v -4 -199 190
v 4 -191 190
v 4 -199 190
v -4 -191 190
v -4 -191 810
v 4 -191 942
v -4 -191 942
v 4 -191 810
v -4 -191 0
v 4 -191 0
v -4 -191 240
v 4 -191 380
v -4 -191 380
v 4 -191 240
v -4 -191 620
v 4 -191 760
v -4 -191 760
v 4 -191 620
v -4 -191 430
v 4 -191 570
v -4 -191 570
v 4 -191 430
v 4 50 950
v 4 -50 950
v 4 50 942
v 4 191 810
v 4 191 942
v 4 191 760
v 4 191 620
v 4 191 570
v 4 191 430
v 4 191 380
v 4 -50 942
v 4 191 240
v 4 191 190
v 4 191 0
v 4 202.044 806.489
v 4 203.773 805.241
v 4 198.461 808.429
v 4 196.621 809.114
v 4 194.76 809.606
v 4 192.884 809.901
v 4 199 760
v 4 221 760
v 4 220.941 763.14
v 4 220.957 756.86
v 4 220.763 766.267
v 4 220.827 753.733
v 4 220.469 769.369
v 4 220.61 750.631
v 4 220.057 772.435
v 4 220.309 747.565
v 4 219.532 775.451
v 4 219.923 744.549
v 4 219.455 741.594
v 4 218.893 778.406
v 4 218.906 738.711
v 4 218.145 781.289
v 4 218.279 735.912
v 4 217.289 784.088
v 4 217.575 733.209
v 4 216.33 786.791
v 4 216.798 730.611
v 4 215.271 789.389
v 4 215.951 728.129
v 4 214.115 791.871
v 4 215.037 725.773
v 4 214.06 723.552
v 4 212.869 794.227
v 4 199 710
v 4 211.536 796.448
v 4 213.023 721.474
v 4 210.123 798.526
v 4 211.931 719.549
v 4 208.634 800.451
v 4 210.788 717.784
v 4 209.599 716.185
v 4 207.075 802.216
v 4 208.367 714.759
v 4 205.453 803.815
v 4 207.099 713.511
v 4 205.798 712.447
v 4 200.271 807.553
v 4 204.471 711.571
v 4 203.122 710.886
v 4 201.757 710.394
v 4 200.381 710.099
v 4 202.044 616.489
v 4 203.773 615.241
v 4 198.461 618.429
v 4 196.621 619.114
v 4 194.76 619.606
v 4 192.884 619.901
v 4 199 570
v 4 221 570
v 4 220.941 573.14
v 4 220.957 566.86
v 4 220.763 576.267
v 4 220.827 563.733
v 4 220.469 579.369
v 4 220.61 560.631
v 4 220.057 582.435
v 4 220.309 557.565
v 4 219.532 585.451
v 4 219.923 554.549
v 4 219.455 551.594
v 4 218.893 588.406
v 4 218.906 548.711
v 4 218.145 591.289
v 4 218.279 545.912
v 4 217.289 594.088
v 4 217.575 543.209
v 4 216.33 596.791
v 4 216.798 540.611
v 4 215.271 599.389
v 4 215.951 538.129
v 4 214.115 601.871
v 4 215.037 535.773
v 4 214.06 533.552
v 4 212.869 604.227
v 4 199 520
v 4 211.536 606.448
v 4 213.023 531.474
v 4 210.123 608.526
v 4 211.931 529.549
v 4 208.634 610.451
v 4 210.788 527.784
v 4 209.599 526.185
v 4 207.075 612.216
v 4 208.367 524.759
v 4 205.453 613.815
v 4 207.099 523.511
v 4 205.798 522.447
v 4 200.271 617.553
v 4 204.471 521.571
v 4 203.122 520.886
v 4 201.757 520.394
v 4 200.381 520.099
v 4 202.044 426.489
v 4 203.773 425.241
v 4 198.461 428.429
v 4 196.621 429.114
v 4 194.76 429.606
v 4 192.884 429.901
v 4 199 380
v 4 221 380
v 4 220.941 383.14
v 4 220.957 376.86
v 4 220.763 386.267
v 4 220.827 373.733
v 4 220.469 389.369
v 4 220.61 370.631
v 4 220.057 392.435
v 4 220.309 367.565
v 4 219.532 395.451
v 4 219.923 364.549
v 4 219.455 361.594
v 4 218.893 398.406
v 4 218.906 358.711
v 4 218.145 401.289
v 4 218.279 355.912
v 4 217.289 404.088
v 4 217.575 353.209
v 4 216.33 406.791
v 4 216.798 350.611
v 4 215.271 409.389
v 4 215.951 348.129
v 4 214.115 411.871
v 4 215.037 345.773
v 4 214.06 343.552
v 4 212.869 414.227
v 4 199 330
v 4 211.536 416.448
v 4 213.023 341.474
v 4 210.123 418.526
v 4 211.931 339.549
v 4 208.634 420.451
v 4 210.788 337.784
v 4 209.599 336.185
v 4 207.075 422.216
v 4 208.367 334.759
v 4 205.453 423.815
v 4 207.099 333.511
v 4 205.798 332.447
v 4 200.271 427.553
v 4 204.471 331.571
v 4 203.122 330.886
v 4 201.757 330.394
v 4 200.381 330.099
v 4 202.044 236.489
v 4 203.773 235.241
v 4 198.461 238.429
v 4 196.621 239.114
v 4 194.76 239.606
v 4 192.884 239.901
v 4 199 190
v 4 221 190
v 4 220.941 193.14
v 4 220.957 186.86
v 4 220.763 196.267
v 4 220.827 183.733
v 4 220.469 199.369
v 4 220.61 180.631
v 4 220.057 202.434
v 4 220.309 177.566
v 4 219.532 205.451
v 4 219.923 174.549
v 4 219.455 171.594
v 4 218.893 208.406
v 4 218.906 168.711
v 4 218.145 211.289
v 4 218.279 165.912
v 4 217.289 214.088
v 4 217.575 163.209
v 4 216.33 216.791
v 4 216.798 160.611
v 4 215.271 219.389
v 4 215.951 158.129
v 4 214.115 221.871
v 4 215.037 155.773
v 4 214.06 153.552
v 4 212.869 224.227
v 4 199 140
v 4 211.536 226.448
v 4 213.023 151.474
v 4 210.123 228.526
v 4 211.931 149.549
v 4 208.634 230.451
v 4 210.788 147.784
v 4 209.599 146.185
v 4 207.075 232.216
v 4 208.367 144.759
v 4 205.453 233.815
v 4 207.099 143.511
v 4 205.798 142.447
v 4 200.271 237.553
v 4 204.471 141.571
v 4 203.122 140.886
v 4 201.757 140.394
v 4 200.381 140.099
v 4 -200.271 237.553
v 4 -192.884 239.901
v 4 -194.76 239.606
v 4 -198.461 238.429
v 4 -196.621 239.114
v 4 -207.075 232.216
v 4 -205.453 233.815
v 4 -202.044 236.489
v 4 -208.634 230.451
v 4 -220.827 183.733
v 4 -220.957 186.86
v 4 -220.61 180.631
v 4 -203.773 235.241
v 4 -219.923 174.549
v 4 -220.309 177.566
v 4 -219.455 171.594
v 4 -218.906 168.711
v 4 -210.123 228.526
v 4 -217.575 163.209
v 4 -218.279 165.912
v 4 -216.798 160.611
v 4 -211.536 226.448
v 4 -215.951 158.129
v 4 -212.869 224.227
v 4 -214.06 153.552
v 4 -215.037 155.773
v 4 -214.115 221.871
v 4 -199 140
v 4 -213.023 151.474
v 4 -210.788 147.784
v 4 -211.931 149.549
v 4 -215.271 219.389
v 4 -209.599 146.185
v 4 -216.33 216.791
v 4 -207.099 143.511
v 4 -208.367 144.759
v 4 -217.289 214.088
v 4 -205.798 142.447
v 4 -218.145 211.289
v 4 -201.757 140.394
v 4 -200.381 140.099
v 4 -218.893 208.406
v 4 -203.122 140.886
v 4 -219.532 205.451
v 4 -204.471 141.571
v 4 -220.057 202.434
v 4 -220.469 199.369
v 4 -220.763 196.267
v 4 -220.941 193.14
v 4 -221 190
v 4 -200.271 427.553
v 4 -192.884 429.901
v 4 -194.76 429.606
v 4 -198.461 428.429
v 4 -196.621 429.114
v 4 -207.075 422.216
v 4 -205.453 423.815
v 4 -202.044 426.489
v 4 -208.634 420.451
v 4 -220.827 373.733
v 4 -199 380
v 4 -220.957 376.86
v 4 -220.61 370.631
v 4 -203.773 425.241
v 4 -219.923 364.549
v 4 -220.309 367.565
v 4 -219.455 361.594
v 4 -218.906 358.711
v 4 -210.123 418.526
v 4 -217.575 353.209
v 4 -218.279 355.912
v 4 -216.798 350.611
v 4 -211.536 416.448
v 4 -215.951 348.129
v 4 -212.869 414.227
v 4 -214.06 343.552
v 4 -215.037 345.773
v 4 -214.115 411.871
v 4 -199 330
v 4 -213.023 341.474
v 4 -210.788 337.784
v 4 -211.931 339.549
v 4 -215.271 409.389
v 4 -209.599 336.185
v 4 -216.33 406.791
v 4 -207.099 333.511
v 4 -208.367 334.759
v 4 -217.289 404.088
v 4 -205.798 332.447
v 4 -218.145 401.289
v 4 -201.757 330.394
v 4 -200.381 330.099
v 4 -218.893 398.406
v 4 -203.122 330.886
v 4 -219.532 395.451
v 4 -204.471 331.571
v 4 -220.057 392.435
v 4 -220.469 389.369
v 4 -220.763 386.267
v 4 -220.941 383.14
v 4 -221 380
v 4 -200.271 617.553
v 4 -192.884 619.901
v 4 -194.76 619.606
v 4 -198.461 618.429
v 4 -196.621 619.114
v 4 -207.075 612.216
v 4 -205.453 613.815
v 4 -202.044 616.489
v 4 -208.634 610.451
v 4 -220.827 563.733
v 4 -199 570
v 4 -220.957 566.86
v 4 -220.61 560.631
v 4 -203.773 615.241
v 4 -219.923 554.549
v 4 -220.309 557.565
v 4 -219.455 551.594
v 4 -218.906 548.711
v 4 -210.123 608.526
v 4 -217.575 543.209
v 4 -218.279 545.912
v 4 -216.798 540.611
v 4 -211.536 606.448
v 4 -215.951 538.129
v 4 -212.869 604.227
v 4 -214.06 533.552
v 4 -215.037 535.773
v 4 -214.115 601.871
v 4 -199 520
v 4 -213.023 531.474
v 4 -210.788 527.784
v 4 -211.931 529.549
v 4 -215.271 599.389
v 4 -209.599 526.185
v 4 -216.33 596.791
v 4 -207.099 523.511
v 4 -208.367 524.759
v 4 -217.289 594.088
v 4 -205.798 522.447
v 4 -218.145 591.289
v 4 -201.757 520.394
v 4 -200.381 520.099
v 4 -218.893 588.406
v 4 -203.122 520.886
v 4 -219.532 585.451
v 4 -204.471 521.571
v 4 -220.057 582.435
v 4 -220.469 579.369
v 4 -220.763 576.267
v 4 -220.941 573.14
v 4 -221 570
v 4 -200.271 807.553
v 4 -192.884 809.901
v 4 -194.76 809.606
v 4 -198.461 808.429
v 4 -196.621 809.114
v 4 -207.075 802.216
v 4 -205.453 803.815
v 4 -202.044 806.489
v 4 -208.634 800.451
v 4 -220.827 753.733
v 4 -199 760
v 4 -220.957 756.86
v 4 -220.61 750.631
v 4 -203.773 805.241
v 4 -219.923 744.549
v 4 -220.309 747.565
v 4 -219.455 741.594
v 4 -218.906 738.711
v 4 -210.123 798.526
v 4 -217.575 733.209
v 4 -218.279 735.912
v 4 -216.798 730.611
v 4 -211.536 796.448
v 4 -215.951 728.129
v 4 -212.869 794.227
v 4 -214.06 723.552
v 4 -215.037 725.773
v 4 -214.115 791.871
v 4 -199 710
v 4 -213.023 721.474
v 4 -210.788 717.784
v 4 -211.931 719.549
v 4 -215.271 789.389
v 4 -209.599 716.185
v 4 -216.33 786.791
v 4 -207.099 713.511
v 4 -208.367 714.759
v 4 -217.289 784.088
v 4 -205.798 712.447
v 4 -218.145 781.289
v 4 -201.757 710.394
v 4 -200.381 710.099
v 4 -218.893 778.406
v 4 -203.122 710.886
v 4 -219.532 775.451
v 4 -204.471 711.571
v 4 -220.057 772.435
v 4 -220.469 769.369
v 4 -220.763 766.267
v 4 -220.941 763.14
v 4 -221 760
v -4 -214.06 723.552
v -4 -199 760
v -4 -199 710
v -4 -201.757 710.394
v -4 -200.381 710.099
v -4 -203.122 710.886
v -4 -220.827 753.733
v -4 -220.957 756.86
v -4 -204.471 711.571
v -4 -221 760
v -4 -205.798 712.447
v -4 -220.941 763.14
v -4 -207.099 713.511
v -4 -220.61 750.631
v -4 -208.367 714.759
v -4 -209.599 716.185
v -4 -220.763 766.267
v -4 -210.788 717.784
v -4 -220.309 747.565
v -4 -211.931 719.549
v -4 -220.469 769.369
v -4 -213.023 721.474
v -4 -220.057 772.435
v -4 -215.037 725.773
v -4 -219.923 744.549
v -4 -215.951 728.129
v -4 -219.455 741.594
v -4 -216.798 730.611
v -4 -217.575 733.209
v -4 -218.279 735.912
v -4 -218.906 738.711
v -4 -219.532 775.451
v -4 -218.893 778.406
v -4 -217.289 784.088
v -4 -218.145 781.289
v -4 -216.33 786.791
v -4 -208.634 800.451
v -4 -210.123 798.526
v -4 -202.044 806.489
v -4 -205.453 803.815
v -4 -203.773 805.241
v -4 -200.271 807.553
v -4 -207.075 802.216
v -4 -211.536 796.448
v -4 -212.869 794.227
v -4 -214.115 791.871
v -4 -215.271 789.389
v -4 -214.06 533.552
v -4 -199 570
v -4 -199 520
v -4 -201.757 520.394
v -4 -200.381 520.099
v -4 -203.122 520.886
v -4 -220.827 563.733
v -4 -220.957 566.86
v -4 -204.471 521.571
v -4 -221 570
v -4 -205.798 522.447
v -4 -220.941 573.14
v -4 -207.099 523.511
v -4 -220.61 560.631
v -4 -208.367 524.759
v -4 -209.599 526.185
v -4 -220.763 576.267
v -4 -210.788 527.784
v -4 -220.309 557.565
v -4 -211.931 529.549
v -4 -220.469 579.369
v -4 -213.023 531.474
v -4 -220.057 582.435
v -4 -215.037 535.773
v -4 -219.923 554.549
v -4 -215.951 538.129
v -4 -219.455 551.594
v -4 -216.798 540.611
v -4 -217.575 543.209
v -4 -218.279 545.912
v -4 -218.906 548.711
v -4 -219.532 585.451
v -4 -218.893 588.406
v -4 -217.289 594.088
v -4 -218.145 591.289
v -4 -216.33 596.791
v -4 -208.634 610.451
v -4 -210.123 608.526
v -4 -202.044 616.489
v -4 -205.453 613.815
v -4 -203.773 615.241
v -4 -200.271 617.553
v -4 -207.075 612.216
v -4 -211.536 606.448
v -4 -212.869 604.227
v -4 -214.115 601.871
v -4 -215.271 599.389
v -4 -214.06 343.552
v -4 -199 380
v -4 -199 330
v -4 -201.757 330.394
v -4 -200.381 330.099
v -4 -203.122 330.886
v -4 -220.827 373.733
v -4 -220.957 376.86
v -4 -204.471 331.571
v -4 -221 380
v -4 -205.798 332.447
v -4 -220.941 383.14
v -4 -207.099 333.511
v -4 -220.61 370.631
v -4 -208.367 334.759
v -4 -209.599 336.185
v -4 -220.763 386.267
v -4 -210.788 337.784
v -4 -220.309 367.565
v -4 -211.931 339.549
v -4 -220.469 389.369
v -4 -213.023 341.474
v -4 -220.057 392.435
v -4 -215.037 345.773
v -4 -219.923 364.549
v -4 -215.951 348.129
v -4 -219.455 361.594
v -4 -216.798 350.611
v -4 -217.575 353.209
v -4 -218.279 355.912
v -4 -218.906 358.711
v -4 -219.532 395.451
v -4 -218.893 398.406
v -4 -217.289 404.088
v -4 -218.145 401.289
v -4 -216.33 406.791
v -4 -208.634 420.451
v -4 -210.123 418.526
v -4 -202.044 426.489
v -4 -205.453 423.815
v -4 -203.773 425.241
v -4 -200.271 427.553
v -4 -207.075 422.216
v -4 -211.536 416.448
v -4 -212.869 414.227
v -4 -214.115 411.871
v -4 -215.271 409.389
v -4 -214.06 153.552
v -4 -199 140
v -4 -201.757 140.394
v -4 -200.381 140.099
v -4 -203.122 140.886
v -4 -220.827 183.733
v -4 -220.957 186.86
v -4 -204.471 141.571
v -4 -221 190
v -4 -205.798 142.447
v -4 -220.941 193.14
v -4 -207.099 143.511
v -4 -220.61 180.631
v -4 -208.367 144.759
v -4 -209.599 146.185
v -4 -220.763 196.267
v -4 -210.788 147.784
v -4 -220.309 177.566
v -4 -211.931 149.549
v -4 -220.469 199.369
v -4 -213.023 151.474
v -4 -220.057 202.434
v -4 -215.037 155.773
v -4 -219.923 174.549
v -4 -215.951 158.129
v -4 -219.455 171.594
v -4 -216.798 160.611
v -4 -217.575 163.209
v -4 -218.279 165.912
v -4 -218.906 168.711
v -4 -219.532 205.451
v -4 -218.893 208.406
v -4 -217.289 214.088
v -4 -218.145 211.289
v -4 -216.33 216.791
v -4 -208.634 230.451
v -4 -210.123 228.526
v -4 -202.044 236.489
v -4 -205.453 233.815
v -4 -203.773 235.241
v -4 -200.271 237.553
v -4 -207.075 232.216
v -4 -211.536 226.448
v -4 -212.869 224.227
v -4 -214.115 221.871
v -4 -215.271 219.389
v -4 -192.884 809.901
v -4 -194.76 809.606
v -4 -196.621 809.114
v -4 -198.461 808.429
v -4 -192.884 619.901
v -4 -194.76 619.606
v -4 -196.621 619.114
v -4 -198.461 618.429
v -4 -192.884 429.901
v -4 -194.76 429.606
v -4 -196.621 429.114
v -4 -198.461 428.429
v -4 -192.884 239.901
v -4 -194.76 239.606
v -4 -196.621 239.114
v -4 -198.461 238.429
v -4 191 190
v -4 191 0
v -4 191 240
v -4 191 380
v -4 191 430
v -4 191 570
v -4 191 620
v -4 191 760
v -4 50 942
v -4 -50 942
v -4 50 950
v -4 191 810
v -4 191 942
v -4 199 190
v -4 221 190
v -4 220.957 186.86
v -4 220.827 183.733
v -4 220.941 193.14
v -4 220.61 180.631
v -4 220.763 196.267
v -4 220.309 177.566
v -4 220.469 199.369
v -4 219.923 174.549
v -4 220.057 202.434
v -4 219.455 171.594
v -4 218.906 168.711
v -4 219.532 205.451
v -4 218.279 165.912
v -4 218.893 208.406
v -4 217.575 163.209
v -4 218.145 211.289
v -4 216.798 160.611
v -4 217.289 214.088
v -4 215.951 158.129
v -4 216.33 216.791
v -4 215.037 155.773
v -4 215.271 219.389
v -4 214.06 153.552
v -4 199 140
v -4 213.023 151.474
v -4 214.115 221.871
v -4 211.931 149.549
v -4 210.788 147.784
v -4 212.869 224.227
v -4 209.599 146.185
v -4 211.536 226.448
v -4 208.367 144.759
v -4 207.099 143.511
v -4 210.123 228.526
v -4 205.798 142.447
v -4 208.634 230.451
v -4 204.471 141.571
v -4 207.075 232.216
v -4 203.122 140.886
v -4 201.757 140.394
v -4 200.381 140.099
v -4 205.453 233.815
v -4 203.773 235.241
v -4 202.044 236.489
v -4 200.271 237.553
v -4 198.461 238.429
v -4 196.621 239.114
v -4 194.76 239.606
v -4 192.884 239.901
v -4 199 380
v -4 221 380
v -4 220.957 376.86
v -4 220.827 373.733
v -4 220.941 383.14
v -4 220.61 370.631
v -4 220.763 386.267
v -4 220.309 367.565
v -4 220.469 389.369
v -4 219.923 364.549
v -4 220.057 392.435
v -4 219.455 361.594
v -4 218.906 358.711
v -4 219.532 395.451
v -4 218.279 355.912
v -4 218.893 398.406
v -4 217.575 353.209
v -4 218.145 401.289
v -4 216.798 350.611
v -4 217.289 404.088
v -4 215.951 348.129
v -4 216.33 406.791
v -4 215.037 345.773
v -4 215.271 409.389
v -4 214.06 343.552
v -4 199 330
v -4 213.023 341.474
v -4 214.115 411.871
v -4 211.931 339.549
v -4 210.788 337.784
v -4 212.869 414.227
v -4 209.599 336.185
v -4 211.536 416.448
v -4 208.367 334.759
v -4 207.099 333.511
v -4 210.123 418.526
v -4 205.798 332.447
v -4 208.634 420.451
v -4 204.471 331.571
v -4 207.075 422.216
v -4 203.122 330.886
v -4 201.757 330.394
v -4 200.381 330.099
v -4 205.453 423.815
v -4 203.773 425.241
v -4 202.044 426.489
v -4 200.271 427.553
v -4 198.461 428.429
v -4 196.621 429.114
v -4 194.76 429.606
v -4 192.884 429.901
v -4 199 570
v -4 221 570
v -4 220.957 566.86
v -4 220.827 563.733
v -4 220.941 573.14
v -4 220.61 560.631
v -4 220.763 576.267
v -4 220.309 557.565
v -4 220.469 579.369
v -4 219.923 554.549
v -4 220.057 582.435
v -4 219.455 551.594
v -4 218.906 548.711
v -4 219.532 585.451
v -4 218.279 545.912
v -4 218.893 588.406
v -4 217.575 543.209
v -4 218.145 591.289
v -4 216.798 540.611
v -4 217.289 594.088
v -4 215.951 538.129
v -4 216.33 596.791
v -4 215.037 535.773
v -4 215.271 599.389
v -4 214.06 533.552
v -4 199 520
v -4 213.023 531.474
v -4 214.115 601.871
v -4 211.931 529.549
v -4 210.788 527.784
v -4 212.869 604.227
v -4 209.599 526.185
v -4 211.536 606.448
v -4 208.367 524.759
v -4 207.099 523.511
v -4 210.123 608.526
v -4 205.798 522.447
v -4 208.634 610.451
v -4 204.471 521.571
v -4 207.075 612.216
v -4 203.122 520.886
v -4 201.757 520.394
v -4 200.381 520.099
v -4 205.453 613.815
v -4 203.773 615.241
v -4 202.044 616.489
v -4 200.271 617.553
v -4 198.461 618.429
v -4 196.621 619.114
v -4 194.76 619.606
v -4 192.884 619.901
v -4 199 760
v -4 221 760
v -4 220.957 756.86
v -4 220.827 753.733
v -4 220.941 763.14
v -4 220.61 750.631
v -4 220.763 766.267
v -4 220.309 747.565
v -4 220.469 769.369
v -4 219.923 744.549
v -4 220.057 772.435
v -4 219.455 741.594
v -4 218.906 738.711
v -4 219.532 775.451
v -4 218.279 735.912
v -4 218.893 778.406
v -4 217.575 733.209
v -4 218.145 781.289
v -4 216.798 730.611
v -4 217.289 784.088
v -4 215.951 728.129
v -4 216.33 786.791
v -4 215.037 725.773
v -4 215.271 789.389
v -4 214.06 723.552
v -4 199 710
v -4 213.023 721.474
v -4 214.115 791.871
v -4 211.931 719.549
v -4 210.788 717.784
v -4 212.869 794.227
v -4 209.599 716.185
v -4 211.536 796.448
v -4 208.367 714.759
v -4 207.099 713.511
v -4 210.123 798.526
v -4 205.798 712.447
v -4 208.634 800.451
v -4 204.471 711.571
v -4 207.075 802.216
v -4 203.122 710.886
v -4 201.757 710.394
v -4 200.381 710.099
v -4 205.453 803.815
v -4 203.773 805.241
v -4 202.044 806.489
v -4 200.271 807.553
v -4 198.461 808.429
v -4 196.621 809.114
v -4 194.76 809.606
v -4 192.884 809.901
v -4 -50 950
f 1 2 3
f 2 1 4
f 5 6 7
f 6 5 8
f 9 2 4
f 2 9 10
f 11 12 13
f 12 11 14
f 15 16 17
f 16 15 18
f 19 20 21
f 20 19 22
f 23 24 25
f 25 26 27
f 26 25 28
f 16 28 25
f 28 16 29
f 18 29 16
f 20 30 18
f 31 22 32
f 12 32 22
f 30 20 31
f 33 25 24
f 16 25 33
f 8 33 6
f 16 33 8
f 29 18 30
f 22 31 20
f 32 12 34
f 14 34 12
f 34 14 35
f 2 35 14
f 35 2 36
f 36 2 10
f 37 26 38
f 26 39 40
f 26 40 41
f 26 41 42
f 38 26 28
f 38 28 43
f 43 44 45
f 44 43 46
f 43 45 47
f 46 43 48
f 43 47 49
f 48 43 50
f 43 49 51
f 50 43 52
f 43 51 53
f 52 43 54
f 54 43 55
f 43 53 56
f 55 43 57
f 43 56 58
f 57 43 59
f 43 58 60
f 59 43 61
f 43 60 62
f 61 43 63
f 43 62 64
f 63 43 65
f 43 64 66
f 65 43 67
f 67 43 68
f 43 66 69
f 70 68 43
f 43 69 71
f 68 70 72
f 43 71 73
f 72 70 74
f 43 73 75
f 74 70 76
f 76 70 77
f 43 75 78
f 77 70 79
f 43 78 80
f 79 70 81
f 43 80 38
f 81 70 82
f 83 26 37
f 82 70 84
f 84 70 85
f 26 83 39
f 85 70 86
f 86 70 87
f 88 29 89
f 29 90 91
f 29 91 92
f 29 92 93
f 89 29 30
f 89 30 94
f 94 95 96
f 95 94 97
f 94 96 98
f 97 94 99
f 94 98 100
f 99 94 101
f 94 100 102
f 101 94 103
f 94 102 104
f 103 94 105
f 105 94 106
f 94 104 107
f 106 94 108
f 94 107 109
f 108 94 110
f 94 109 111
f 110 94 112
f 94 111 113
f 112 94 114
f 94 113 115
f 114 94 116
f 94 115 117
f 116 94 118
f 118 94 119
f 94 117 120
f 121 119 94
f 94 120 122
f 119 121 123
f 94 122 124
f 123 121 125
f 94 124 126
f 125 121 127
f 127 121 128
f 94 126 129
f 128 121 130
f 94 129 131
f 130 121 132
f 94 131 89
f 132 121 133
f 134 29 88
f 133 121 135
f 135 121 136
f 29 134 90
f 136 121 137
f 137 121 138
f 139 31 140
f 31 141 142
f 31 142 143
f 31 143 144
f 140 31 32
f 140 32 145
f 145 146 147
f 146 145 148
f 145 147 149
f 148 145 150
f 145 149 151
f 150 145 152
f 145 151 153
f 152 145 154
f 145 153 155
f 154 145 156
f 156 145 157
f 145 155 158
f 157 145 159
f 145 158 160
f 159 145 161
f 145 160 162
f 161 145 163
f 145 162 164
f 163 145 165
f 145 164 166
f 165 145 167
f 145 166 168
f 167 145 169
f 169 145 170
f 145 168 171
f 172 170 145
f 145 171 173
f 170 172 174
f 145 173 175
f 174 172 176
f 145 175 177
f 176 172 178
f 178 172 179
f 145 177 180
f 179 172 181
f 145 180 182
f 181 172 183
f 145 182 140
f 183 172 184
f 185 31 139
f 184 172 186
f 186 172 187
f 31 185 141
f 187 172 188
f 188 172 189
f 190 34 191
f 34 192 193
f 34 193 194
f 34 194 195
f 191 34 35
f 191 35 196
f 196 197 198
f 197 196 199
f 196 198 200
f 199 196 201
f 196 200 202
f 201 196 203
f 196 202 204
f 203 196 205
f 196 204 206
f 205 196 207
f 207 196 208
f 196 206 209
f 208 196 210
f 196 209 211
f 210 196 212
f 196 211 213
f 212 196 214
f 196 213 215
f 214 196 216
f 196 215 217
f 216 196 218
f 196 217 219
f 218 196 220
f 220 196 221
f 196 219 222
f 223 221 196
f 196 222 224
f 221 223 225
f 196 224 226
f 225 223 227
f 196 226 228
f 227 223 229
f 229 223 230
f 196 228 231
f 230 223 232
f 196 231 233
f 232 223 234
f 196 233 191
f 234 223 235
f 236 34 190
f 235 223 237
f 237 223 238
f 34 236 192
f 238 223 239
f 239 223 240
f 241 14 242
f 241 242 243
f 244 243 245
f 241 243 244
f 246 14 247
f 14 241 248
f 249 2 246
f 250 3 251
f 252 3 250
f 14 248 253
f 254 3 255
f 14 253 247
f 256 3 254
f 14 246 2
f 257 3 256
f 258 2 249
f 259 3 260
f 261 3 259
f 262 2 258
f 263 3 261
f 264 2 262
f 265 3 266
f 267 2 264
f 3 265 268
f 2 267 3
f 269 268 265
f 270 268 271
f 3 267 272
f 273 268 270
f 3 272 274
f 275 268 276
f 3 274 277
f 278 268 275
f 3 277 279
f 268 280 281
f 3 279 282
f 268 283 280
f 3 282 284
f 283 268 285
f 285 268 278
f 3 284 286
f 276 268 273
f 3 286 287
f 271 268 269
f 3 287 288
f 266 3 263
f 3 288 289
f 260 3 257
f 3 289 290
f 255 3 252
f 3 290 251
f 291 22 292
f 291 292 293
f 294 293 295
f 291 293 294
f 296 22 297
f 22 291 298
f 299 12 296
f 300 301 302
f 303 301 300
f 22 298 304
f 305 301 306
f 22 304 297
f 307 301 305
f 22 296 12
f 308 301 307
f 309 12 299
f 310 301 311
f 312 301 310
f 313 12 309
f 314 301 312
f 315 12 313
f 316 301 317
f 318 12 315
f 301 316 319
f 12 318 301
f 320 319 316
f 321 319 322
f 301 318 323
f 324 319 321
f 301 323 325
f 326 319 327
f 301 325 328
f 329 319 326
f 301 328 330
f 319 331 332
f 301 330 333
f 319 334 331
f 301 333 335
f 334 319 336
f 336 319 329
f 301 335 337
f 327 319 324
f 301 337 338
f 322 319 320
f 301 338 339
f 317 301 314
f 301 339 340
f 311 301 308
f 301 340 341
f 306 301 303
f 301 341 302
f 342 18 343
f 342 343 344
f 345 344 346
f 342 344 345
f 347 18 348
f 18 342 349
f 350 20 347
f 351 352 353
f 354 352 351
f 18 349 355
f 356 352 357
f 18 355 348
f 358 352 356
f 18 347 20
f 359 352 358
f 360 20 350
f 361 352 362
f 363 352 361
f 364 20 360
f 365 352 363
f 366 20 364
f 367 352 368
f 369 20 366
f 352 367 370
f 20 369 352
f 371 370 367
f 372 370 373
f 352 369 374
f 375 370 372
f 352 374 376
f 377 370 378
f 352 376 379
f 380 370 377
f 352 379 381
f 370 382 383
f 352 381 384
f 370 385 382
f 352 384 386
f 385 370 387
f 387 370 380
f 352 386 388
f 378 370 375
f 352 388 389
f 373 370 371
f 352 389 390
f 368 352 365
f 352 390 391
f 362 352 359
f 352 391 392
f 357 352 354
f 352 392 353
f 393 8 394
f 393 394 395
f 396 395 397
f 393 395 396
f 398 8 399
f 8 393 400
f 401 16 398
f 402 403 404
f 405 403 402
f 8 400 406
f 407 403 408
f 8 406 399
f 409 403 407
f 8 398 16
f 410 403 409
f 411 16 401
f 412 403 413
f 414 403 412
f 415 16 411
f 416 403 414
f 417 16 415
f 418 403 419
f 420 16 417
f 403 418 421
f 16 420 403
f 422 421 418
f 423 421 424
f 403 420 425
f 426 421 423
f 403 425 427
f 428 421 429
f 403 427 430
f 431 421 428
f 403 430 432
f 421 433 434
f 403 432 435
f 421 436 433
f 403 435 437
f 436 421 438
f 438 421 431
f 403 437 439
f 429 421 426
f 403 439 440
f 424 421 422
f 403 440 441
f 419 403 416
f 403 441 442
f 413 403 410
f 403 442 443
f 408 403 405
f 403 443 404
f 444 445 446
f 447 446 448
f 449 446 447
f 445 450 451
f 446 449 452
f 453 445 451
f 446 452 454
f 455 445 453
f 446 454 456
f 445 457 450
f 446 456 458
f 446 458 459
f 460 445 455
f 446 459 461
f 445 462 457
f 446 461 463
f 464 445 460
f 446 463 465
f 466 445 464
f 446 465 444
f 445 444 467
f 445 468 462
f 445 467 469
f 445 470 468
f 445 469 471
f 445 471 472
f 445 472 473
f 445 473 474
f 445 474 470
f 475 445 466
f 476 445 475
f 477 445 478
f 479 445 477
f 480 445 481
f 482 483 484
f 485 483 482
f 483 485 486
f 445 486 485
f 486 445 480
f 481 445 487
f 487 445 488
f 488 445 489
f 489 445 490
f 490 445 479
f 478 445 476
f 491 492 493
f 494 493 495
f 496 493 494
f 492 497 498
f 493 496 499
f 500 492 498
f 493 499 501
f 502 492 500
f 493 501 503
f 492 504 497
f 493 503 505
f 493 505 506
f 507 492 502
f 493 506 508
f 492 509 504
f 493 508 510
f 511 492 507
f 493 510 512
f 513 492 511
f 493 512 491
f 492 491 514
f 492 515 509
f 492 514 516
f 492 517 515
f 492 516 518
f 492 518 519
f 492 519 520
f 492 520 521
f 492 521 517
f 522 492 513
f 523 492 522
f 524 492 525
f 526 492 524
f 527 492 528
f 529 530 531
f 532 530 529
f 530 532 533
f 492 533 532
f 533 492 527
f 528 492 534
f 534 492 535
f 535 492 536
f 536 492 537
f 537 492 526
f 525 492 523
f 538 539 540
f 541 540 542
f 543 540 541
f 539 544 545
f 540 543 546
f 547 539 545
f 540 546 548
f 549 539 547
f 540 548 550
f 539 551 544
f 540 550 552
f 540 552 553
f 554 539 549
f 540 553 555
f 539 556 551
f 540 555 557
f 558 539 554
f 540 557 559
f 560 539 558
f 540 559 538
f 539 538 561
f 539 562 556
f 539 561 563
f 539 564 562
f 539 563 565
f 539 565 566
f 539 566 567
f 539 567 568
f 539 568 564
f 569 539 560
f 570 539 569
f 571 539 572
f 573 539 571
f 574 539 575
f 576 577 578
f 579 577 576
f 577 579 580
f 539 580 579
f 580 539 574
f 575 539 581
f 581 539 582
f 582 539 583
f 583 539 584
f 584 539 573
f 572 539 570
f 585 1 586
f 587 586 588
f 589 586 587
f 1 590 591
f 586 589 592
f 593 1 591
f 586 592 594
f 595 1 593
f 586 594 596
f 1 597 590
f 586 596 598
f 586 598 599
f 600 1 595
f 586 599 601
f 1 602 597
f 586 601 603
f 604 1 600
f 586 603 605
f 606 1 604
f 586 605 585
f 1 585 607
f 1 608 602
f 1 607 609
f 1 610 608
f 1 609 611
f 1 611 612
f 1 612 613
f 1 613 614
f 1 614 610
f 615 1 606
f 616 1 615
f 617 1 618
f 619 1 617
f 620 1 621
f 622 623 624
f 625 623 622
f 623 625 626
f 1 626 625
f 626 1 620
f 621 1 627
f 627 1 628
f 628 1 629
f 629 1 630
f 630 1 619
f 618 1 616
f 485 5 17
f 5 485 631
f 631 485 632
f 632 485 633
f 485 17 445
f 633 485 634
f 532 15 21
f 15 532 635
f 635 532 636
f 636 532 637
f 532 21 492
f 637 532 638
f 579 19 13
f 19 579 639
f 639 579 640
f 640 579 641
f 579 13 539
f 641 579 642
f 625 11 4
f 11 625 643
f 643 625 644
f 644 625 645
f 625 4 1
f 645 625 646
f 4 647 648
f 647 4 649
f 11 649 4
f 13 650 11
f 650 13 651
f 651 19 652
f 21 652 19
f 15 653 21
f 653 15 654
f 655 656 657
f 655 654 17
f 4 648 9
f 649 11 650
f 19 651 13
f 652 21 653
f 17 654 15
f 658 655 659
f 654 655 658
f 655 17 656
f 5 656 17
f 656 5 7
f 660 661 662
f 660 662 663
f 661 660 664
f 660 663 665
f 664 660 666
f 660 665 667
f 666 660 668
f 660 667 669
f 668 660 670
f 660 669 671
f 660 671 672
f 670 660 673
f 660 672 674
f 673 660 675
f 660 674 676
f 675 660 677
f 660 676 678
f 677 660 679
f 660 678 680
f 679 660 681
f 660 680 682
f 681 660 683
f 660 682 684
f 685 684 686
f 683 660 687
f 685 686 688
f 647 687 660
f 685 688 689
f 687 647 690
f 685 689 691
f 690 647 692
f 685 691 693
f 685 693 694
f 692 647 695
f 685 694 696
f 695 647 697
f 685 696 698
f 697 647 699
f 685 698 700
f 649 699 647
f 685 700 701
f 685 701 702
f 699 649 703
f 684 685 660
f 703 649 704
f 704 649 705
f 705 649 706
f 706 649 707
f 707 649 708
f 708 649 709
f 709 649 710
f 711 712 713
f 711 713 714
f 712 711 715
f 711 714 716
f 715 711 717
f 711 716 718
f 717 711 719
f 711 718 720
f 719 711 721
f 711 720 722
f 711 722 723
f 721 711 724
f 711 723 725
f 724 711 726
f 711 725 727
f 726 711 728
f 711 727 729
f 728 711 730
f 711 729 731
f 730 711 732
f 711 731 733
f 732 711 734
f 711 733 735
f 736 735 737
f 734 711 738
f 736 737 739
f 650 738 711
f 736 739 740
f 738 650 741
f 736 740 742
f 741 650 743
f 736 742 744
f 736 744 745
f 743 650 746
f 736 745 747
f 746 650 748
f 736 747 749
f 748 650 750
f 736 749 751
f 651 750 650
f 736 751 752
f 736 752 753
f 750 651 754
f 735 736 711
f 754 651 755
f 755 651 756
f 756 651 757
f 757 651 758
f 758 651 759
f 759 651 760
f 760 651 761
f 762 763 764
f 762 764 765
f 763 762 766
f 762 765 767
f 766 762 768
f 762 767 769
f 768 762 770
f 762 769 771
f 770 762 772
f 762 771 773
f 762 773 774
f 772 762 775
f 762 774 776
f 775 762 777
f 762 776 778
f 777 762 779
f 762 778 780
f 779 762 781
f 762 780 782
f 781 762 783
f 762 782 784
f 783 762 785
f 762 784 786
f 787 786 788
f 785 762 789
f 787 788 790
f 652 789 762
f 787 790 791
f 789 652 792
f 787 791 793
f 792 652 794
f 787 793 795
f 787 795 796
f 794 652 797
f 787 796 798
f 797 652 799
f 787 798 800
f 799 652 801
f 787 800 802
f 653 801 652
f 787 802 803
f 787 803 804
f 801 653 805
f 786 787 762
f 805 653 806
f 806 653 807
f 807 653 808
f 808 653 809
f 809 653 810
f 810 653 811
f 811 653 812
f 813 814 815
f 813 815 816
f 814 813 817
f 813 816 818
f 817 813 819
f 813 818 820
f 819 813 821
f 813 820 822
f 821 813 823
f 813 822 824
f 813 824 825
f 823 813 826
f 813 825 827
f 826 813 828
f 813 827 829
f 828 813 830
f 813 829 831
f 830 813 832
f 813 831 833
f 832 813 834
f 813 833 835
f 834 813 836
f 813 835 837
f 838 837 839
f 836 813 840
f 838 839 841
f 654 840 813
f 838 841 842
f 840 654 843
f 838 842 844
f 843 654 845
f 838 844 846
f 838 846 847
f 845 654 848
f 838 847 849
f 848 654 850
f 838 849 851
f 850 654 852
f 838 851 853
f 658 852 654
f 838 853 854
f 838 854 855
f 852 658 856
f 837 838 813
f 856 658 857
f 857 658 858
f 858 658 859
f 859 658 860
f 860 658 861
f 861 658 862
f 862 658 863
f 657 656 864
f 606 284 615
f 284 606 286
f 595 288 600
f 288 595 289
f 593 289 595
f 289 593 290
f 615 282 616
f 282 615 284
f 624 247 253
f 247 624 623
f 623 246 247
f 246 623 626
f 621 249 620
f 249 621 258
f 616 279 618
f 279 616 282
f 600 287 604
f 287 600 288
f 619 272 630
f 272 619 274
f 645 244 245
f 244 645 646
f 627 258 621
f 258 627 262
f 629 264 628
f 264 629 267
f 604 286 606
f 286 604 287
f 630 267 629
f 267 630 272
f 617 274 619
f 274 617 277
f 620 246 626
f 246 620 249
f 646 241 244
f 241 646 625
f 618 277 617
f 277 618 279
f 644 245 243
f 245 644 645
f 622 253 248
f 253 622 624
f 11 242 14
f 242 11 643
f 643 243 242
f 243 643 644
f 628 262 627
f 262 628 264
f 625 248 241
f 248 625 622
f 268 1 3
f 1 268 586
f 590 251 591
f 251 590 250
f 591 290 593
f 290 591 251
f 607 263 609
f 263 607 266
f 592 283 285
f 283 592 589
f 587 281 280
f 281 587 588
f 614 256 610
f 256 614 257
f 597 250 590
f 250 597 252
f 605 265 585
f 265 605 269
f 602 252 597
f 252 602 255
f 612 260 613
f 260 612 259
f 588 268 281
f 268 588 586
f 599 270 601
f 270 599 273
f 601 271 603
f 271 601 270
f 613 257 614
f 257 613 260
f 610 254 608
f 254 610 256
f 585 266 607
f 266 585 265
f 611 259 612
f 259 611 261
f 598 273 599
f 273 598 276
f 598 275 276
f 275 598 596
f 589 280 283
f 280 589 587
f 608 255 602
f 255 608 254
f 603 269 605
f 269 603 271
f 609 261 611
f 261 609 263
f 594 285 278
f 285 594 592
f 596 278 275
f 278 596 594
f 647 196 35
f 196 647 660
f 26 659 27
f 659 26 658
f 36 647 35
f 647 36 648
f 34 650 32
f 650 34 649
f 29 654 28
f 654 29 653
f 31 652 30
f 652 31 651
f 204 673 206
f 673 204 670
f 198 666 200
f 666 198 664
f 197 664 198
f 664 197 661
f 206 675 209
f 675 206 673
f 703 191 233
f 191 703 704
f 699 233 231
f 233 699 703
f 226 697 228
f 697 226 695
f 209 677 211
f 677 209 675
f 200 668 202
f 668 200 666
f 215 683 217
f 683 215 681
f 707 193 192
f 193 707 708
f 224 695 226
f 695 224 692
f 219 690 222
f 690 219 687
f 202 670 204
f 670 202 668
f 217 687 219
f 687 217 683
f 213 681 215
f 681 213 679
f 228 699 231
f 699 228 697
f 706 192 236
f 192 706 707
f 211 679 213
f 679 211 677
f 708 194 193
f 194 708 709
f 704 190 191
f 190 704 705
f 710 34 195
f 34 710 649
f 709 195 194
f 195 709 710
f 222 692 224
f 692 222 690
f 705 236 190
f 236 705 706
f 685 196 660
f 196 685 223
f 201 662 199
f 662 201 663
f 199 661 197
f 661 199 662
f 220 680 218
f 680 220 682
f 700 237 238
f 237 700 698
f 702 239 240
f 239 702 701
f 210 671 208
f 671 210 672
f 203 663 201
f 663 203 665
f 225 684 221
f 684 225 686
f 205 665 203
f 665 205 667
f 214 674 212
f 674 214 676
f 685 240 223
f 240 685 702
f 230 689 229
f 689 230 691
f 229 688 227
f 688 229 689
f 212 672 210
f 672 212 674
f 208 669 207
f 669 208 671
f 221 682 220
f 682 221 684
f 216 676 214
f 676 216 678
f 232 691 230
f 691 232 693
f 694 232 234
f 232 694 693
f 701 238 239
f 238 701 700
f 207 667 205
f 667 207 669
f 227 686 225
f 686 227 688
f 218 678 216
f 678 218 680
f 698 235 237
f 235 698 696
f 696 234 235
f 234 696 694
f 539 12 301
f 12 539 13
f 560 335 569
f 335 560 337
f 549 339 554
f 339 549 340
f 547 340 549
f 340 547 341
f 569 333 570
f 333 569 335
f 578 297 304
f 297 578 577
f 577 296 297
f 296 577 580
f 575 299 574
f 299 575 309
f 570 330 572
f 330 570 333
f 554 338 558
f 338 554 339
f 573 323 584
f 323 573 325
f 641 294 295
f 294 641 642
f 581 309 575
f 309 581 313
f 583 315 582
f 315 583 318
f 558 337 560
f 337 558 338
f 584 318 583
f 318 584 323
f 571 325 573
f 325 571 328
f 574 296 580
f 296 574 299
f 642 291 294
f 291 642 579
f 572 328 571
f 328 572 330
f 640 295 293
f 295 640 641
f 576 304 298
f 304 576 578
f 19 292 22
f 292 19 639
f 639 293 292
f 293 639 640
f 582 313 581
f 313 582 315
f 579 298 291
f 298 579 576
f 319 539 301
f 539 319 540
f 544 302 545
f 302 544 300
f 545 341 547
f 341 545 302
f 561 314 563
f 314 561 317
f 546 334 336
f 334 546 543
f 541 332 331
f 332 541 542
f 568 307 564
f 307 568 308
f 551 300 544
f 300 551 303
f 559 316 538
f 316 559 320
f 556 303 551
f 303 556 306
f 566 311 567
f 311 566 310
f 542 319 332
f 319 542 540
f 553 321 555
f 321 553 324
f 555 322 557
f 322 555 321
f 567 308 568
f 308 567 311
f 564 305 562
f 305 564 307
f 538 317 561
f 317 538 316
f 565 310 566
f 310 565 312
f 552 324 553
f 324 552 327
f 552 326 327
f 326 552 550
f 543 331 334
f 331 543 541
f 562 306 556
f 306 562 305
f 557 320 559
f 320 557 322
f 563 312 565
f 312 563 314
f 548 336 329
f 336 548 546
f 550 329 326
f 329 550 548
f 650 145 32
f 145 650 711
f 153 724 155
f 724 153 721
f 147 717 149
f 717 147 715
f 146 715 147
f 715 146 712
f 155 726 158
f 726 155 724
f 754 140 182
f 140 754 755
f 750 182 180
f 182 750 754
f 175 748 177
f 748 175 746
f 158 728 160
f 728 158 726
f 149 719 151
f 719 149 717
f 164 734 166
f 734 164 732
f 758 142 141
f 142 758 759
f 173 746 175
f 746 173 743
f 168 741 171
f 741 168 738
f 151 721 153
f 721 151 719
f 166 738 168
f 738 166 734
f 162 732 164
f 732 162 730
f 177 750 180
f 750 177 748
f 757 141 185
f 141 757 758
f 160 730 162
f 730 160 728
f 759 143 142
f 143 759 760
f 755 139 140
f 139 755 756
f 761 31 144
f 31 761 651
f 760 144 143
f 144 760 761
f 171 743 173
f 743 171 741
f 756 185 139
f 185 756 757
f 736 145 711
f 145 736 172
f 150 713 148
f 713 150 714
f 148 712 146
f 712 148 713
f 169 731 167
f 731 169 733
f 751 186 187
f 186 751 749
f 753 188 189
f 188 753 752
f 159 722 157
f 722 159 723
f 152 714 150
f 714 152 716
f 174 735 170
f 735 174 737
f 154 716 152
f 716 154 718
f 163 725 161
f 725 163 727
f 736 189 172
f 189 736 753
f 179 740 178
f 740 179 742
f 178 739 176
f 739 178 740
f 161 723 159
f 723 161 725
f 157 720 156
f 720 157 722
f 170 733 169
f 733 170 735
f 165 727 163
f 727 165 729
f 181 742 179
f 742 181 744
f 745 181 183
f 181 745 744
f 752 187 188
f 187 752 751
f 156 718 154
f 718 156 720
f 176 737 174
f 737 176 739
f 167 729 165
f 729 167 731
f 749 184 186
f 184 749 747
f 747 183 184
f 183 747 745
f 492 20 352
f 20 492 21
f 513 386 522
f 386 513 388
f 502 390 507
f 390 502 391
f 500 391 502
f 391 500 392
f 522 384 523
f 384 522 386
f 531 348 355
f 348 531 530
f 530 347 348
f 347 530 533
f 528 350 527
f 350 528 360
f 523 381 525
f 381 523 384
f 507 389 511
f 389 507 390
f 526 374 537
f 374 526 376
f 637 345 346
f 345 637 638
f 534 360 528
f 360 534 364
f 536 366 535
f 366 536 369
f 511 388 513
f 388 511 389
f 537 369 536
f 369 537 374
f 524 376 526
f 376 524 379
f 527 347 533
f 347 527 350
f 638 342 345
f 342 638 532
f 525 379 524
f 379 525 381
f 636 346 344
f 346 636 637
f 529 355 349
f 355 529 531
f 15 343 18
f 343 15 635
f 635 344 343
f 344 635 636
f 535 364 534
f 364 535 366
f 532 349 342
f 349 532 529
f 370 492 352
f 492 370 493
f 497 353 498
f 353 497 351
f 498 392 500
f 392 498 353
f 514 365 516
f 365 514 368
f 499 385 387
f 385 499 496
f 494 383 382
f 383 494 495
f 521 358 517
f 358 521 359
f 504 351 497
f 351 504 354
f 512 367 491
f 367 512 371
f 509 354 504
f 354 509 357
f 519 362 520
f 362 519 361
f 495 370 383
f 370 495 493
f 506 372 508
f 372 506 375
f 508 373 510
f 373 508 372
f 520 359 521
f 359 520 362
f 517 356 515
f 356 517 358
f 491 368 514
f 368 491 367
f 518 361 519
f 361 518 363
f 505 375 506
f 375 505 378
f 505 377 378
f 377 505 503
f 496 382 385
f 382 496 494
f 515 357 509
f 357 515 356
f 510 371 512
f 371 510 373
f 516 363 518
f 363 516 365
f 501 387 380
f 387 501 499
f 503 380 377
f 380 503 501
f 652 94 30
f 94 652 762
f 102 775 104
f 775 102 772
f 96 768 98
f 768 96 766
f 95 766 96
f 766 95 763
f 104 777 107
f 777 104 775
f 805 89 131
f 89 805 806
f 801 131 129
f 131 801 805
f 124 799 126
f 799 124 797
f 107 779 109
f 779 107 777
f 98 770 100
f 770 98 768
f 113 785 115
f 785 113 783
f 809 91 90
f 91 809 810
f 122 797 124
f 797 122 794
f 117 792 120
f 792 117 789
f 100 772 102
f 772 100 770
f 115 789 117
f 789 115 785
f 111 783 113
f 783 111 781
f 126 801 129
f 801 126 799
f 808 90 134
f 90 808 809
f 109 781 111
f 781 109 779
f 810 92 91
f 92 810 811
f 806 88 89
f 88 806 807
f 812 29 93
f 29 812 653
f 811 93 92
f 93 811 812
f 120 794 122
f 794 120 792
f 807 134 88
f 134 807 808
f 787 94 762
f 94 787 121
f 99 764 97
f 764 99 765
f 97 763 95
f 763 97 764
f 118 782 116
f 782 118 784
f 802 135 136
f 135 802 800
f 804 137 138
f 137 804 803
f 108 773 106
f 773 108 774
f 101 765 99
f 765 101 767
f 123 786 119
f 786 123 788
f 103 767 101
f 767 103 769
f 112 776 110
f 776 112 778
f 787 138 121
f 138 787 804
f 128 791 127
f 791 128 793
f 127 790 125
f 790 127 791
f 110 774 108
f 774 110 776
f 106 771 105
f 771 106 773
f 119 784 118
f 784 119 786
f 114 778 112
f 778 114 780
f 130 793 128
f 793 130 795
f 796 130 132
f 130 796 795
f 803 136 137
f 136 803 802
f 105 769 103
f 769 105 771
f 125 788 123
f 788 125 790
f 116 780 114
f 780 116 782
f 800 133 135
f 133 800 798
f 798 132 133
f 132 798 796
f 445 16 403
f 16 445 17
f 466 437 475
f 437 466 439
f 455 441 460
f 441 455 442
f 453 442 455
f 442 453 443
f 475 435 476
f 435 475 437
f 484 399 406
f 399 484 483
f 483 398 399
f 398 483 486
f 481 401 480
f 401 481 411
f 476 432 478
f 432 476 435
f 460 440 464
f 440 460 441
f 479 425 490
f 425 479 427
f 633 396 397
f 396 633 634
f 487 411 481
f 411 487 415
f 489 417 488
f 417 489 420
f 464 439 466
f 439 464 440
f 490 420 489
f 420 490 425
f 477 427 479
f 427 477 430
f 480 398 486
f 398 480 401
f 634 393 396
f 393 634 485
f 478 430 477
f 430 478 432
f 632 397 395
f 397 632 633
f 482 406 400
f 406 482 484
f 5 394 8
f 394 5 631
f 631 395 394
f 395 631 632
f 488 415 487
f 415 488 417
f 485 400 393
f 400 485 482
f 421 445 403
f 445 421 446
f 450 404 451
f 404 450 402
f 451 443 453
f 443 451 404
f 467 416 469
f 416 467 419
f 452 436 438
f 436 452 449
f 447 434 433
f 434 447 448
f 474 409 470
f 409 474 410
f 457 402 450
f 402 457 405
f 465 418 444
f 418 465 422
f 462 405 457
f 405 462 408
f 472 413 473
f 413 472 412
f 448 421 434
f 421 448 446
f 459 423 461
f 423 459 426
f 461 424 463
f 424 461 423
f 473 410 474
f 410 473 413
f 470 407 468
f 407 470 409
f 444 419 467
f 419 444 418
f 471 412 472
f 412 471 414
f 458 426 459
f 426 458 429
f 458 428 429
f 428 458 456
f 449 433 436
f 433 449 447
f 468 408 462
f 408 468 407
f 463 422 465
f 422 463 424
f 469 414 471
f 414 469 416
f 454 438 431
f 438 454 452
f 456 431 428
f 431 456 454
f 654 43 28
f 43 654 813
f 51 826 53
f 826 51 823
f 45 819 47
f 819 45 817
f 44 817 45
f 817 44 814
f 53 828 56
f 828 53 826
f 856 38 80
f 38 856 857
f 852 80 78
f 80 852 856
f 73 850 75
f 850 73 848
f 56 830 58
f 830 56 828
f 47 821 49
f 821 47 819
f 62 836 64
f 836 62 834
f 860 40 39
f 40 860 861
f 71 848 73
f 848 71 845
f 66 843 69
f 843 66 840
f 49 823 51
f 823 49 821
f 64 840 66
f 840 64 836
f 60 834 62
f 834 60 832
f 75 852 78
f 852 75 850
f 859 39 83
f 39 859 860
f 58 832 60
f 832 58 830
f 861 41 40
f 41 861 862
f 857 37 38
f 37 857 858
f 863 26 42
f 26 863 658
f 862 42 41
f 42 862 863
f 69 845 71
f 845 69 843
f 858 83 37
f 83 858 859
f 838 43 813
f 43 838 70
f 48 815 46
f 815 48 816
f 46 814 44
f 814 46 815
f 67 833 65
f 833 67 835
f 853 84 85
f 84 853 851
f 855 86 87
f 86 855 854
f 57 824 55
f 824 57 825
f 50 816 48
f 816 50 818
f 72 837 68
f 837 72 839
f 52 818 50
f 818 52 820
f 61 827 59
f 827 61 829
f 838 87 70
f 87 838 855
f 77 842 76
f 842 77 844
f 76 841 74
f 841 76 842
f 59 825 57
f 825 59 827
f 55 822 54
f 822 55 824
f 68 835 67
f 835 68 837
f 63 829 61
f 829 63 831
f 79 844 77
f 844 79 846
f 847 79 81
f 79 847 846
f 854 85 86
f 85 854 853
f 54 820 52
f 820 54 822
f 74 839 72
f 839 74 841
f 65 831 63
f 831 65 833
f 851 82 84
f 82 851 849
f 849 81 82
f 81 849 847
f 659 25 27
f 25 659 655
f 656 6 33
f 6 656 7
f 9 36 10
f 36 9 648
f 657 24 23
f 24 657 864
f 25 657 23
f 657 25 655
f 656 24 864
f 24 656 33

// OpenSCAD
// file: joint.scad
include <global.scad>;

module joint()
{
    // center in y-direction
    translate([
        0,
        -material_width/2,
        0
        ])
    {
        // main support structure
        intersection()
        {
            cube([
                joint_x,
                material_width,
                joint_y
                ]);

            scale([
                joint_x,
                material_width,
                joint_y
                ])
            rotate([90, 0, 0])
            cylinder(r=1, h=2, center=true);
        }

        // add hook
        translate([
            material_width,
            0,
            0
            ])
        mirror([0, 0, 1])
        intersection()
        {
            cube([
                joint_x - material_width,
                material_width,
                joint_hook_y
                ]);

            scale([
                joint_x - material_width,
                material_width,
                joint_hook_y
                ])
            rotate([90, 0, 0])
            cylinder(r=1, h=2, center=true);
        }
    }
}

joint();
// file: global.scad
// all measures in mm

$fn = 100;
nothing = 0.01;

material_x = 510;
material_y = 370;
material_width = 8;

leg_x = 450;
leg_z = 950;

// about hoch much the faces in Y direction are inset
face_y_inset = 30;

// how far the joint extends planarly from the face
joint_x = 30;

// Assume same material measure as for X plane
leg_y = leg_x - joint_x*2;

// the lateral width of the joint
joint_y = 50;
// how far down the hook extends
joint_hook_y = 50;

joint_total_height = joint_y + joint_hook_y;

num_joints = 4;
q = leg_z/(num_joints+1);
joint_height = [q, 2*q, 3*q, 4*q];

nose_width = 100;
nose_z = material_width;

// how far apart from on another to project the parts
projection_spacing = 1;
// main file
include <global.scad>;
use <joint.scad>;

/**
 * One of the two planes lying in YZ layer
 */
module face_y()
{
    color("green")
    // center
    translate([
        0,
        -(leg_y - material_width)/2,
        0
        ])
    {
        // basic rectangular face
        translate([
            -material_width/2,
            0,
            0])
        cube([
            material_width,
            leg_y - material_width,
            leg_z - nose_z
            ]);

        // Put a nose on the top
        translate([
            0,
            (leg_y - material_width)/2,
            leg_z - nose_z/2 - nothing
            ])
        cube([
            material_width,
            nose_width,
            nose_z + 2*nothing
            ], center=true);

        /*
         * add joints
         */
        for (z = joint_height)
        {
            // add all the configured heights
            translate([
                0,
                0,
                z
                ])
            {
                // in the direction of -Y
                rotate([0, 0, -90])
                    joint();

                // in the direction of +Y
                translate([0, leg_y - material_width, 0])
                    rotate([0, 0, 90])
                        joint();
            }
        }
    }
}

face_y();
